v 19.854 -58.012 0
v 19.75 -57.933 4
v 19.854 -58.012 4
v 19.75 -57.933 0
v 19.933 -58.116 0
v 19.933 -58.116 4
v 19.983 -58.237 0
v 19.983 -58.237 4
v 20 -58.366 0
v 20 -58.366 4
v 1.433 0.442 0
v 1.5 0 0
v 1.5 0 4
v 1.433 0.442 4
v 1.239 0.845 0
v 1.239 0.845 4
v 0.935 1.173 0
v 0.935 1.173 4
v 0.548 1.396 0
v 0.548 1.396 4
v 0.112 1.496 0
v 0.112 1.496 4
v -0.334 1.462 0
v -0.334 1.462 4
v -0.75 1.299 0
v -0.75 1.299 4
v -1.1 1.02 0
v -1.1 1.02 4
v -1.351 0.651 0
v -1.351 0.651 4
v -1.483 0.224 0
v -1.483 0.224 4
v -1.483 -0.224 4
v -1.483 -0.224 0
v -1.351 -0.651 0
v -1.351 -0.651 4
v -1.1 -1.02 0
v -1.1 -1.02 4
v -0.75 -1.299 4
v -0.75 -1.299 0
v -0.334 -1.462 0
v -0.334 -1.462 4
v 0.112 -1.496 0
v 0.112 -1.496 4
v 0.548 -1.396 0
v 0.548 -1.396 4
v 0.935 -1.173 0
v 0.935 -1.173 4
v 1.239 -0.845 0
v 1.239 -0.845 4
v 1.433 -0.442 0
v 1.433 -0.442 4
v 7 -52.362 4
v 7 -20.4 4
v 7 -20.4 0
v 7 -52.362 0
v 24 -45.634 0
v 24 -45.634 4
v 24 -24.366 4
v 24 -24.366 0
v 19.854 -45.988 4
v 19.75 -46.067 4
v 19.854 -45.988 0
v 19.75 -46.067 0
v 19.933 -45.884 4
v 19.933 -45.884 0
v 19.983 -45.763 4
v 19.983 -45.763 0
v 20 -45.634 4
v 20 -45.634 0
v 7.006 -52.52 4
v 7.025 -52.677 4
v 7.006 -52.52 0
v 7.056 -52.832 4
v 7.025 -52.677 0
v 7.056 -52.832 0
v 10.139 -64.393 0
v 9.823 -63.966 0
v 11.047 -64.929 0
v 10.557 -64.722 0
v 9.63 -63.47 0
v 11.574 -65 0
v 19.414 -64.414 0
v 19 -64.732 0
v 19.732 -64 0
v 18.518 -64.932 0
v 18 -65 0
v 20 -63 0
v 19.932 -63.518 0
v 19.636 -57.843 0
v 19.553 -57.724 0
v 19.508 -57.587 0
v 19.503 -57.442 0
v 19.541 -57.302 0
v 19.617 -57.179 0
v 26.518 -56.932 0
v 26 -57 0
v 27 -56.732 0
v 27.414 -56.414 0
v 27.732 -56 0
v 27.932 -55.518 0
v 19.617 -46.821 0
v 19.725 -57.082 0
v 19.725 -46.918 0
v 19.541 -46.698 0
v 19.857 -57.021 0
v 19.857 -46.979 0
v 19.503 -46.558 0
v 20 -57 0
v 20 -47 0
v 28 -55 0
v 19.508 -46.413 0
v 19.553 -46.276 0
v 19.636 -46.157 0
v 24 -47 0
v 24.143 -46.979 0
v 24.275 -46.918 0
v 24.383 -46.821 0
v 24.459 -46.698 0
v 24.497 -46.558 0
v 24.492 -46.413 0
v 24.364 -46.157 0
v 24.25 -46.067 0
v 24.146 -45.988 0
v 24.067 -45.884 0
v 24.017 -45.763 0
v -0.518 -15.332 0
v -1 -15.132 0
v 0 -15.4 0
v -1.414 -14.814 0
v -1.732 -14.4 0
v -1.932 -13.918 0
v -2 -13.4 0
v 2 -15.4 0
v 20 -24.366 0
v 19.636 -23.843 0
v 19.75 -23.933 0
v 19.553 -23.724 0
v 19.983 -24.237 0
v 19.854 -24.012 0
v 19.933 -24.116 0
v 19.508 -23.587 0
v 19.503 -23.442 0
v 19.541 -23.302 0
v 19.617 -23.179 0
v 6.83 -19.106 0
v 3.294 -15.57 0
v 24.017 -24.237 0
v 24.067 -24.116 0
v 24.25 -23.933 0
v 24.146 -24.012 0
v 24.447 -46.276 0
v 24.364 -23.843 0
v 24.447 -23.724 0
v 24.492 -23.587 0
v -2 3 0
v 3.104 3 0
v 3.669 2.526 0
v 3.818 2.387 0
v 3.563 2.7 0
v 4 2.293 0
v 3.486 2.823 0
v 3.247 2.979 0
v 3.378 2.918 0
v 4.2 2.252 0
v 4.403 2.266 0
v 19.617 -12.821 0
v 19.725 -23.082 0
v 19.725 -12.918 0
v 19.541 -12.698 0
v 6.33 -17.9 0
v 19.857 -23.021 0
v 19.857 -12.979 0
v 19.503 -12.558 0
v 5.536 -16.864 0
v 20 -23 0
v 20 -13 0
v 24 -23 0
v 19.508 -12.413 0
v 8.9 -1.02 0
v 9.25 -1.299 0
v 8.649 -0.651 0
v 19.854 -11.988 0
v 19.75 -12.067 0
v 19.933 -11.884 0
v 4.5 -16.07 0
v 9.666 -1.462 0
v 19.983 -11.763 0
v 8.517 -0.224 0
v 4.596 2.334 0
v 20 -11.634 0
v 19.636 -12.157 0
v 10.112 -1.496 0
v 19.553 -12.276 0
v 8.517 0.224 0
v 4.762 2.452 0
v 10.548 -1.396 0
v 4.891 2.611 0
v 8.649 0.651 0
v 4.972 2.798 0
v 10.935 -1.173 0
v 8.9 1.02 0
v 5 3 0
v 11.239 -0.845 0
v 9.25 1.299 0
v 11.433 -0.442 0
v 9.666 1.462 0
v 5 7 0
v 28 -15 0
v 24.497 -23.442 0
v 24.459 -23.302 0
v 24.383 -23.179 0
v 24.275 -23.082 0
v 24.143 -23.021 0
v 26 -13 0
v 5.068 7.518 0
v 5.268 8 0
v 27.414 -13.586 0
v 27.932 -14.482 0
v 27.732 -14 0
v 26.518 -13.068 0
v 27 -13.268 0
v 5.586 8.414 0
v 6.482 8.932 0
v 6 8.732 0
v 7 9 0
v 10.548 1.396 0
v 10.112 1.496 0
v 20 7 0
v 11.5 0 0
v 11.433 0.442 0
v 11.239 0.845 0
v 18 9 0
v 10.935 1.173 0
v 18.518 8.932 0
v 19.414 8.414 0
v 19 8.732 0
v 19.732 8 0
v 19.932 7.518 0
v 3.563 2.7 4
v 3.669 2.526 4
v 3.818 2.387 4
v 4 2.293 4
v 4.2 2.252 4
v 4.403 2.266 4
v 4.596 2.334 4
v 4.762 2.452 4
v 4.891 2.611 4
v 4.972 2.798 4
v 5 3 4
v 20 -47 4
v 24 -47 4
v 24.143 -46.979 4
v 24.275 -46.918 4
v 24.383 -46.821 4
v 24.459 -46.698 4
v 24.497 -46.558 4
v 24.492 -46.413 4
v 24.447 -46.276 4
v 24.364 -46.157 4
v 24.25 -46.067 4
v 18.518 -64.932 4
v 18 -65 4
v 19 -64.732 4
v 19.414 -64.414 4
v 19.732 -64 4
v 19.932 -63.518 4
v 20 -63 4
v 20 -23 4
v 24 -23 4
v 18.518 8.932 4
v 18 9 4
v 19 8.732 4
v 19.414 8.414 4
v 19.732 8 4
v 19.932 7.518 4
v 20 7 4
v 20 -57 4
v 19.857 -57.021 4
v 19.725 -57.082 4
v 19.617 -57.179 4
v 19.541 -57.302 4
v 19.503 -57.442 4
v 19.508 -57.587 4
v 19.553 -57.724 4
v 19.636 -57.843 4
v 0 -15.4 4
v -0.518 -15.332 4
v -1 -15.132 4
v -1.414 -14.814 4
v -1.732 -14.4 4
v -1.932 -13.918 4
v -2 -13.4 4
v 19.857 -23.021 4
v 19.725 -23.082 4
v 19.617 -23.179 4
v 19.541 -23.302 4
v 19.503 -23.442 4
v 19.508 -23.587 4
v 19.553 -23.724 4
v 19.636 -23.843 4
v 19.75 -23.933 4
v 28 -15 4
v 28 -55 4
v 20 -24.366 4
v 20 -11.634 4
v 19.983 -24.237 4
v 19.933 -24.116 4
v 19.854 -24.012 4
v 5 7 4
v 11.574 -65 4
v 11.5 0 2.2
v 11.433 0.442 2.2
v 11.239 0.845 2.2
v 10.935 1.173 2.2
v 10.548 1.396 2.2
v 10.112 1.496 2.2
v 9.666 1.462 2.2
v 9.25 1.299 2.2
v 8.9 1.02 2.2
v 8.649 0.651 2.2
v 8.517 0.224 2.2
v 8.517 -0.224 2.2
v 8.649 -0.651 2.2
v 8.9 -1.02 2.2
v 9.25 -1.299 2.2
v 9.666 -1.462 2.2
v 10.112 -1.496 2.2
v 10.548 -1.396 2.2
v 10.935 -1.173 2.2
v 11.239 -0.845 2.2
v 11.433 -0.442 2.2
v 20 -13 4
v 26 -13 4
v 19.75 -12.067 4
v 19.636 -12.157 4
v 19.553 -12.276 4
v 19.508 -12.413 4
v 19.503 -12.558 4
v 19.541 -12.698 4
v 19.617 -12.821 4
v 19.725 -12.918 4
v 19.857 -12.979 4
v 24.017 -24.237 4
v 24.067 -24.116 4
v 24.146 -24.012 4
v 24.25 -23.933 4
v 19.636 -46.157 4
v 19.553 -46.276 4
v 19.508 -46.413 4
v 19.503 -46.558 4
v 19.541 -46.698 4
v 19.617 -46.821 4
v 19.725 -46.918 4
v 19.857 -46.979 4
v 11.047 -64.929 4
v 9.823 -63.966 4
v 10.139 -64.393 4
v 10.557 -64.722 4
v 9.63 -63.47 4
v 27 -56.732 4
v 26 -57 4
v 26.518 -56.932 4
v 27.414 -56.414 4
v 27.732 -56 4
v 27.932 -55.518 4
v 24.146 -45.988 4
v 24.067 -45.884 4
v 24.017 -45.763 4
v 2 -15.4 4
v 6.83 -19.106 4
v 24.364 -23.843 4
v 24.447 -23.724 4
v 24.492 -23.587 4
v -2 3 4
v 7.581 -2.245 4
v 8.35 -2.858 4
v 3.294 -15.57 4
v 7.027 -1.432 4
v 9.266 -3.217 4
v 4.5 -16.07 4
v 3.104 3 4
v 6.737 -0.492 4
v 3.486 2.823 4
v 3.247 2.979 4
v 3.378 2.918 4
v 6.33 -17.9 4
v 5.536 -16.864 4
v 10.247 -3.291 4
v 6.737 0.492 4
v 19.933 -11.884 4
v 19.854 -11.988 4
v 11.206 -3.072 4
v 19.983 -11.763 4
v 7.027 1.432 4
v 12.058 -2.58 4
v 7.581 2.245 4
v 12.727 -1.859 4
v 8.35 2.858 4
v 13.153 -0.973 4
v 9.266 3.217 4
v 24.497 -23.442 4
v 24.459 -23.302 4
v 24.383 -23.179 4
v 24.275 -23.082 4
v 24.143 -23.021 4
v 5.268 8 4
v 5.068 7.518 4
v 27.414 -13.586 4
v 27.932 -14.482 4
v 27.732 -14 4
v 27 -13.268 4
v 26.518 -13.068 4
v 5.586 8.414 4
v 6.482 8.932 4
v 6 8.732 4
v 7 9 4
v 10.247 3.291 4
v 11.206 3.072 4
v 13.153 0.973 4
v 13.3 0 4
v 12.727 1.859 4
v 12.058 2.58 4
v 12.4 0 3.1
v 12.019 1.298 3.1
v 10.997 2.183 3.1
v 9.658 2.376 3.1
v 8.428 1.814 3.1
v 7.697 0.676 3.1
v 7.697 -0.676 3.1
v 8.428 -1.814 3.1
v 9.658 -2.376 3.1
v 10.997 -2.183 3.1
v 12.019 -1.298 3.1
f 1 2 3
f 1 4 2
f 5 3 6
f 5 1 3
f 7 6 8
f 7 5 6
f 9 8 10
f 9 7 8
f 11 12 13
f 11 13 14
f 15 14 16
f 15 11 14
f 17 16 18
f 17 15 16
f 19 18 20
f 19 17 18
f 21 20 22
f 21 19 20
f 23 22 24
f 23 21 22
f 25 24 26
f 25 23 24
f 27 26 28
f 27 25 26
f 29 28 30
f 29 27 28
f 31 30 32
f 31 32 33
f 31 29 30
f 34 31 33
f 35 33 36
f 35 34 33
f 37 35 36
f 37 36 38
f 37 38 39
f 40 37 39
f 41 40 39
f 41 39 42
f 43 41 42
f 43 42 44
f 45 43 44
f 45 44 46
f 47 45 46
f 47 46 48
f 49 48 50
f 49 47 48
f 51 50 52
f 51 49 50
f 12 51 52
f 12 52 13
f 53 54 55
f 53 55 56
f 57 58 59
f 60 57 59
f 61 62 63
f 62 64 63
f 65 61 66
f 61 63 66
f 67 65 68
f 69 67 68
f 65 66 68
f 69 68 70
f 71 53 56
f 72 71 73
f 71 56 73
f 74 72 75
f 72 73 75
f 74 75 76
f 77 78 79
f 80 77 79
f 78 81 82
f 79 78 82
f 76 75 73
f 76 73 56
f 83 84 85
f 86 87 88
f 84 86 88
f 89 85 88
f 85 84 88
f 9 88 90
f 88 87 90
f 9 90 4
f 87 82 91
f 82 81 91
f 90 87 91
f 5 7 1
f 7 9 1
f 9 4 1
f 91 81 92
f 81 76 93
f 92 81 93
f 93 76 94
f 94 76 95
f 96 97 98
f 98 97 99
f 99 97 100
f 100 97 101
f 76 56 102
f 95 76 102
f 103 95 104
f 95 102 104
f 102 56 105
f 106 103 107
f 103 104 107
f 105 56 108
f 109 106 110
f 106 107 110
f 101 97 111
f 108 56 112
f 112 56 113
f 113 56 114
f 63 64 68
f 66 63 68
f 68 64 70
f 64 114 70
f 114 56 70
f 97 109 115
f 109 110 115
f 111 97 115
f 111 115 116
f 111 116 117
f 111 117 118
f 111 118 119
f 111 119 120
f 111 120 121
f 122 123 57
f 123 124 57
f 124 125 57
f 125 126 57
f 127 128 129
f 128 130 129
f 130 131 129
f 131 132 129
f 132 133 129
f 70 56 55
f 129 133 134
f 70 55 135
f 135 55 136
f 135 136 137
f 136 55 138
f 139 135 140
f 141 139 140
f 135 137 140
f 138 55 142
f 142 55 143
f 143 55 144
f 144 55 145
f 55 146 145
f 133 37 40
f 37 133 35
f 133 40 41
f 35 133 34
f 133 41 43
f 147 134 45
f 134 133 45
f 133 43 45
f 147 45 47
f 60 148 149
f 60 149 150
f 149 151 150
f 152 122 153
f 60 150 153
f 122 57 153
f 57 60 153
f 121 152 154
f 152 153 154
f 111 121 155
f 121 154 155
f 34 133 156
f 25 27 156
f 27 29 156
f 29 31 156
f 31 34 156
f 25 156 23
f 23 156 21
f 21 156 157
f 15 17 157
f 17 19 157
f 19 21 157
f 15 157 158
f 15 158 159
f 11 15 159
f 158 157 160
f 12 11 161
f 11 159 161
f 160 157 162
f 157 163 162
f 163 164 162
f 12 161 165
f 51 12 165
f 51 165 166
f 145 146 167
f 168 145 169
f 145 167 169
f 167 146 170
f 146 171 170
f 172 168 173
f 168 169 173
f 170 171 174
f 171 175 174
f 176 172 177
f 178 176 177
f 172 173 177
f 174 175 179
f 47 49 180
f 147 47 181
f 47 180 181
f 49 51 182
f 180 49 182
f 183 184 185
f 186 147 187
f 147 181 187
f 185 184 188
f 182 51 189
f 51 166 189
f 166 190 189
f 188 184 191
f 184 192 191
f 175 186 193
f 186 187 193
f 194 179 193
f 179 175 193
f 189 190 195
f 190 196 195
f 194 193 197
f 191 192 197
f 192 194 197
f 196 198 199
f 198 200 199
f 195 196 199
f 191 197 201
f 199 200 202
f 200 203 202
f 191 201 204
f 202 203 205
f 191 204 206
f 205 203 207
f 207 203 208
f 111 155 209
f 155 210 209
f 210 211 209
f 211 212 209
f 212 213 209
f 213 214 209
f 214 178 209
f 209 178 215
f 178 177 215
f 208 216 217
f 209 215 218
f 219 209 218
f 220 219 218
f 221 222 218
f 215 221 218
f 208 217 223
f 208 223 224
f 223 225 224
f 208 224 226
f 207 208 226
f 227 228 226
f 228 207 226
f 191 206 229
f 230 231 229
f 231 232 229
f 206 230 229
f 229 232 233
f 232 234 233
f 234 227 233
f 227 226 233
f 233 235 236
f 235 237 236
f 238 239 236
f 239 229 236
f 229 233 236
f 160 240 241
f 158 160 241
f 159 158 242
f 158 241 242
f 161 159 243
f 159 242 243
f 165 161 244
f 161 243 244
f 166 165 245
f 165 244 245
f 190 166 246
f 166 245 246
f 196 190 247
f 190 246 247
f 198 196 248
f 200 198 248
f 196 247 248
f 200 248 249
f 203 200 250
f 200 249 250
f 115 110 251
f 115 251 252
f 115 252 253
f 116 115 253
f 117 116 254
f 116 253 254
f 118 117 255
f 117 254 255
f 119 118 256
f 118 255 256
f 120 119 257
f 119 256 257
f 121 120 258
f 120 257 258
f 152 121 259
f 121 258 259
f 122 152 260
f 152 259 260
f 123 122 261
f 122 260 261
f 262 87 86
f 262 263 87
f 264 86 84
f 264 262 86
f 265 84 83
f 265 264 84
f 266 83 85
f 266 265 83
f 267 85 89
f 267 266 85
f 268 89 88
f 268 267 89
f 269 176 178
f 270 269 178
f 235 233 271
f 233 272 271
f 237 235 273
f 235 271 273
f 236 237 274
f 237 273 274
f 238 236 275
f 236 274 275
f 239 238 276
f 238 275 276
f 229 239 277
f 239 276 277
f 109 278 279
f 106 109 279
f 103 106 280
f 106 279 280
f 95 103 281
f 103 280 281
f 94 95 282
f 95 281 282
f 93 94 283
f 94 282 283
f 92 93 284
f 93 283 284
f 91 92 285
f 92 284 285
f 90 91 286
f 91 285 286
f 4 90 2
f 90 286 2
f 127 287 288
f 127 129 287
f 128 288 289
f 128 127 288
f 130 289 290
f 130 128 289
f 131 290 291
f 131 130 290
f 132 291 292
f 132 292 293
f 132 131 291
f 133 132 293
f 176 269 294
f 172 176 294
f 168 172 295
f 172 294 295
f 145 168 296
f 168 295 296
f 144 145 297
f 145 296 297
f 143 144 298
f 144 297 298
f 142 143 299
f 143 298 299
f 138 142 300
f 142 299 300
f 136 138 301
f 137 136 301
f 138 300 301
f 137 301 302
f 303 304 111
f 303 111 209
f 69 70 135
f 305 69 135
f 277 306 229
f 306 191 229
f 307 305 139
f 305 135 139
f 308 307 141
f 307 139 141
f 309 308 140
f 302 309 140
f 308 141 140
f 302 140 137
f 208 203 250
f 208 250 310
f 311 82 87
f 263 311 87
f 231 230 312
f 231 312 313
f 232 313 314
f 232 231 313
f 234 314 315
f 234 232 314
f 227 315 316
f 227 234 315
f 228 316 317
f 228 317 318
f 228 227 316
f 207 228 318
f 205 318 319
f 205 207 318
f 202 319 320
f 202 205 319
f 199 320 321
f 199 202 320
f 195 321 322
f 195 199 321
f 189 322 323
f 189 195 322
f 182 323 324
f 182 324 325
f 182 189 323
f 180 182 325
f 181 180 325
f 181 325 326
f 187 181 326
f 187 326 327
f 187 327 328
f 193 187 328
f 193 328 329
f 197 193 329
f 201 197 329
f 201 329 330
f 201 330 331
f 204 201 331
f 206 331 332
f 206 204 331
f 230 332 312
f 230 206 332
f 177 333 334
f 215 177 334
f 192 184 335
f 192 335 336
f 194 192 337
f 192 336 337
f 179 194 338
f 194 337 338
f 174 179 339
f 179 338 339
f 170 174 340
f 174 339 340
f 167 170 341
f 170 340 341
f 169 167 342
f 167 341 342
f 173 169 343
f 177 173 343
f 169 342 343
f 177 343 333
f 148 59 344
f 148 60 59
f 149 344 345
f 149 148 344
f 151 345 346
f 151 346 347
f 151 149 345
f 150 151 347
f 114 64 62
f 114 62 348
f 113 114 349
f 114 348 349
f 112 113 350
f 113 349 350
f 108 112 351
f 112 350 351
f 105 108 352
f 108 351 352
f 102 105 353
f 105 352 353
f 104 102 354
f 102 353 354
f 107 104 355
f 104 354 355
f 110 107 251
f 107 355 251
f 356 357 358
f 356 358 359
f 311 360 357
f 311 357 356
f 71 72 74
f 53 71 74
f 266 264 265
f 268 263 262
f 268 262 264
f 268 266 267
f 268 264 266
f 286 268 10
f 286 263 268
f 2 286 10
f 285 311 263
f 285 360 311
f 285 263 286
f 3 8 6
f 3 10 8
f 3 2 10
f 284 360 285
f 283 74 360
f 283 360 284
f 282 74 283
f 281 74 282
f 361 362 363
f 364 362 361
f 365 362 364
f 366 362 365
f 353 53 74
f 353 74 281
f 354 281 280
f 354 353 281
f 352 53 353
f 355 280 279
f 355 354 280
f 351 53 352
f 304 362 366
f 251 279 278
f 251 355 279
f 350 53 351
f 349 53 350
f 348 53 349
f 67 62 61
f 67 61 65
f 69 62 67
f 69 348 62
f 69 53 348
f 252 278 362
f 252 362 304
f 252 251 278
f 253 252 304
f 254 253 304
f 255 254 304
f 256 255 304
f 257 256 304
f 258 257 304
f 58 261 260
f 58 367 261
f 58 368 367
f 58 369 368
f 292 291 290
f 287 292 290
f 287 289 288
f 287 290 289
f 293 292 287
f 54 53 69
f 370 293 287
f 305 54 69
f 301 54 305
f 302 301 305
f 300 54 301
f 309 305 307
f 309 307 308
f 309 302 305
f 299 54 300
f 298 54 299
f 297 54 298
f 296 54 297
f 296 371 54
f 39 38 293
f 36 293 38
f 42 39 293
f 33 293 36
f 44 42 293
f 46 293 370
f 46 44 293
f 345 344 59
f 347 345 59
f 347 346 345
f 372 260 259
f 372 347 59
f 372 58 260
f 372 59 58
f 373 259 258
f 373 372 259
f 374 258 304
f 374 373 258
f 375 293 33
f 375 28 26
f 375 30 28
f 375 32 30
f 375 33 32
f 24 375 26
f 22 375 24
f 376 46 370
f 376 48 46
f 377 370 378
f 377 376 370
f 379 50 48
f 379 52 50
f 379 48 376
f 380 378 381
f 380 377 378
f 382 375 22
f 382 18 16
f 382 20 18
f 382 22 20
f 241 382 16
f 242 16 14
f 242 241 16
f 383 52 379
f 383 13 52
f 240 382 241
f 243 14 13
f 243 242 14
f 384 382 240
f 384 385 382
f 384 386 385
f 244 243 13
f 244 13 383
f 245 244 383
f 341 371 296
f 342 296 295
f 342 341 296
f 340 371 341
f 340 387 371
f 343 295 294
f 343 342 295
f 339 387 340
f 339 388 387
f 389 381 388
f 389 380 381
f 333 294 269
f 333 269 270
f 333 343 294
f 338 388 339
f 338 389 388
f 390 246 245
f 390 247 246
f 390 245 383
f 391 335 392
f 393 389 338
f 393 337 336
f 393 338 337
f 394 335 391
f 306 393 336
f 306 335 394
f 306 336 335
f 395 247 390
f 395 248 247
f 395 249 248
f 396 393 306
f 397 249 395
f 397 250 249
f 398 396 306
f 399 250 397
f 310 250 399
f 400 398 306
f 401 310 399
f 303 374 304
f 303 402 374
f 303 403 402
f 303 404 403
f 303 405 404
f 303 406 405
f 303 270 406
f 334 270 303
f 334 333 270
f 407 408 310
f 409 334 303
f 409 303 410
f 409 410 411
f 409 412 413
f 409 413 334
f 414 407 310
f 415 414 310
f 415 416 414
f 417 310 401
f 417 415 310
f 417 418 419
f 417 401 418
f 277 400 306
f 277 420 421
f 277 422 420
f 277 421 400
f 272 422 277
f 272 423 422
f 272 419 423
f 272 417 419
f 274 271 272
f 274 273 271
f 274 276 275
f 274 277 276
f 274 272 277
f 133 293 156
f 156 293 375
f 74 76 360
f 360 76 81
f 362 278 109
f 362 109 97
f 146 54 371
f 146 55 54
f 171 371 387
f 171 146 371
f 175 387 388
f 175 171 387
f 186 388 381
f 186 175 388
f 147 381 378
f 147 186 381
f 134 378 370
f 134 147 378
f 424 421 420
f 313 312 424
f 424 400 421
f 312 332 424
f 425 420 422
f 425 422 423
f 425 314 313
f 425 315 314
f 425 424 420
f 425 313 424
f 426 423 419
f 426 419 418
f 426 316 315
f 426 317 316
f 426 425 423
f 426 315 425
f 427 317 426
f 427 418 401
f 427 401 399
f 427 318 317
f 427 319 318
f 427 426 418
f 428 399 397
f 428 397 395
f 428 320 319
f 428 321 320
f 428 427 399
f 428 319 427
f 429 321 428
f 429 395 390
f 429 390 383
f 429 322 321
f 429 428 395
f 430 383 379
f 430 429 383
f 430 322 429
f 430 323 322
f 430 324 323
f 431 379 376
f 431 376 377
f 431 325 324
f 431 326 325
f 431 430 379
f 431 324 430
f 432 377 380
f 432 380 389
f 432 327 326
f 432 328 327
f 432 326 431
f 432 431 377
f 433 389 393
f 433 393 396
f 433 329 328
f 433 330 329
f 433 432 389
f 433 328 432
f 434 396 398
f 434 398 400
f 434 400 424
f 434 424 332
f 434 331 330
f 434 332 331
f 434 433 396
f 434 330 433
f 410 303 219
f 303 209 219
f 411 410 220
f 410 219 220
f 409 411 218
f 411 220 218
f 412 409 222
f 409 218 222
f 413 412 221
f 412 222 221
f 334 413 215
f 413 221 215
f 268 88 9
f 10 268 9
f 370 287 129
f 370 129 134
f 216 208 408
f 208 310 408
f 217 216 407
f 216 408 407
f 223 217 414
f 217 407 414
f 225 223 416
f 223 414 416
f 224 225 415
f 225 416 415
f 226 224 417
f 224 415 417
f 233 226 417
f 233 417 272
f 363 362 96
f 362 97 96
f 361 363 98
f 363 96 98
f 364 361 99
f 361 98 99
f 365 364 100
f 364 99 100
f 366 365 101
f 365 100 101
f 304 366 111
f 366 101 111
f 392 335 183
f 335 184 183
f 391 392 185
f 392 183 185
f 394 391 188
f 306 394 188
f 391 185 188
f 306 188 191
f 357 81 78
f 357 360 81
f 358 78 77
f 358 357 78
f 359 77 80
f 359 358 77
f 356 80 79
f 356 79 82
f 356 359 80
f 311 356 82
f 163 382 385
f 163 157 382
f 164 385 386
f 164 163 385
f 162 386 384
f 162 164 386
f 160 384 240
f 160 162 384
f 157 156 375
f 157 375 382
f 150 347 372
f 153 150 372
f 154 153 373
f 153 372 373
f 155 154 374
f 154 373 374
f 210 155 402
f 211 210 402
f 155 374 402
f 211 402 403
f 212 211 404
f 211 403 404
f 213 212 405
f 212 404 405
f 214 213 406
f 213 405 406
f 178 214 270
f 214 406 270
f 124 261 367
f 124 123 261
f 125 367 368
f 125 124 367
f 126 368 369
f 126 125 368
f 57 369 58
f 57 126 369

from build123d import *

# Parameters (mm, degrees)
SKETCH_1_W          = 15
SKETCH_1_H          = 6
SKETCH_1_W_2        = 25
SKETCH_1_R          = 1.5
SKETCH_1_W_3        = 4
SKETCH_1_H_2        = 10
EXTRUDE_1_DEPTH     = 4
CUT_EXTRUDE_1_DEPTH = 4
CHAMFER_1_SIZE      = 1.8
SKETCH_3_W          = 4
SKETCH_3_H          = 44
EXTRUDE_2_DEPTH     = 4
CUT_EXTRUDE_2_DEPTH = 4
FILLET_1_R          = 0.5
SKETCH_12_W         = 3
SKETCH_12_H         = 18.4
CUT_EXTRUDE_6_DEPTH = 10
CUT_EXTRUDE_7_DEPTH = 10
FILLET_2_R          = 5
FILLET_3_R          = 2


with BuildPart() as part:
    # 草图1 → 凸台-拉伸1 (new body)
    # profile 1 of 5: a face of its own
    with BuildSketch(Plane.XY):
        with Locations((12.5, 6)):
            Rectangle(SKETCH_1_W, SKETCH_1_H)
    # profile 2 of 5: a face of its own
    with BuildSketch(Plane.XY):
        with Locations((7.5, 0)):
            Rectangle(SKETCH_1_W_2, SKETCH_1_H)
        Circle(SKETCH_1_R, mode=Mode.SUBTRACT)
        with Locations((10, 0)):
            Circle(SKETCH_1_R, mode=Mode.SUBTRACT)
    # profile 3 of 5: a face of its own
    with BuildSketch(Plane.XY):
        Polygon((10, -65), (20, -65), (20, -3), (-5, -3), align=None)
    # profile 4 of 5: a face of its own
    with BuildSketch(Plane.XY):
        with Locations((22, -18)):
            Rectangle(SKETCH_1_W_3, SKETCH_1_H_2)
    # profile 5 of 5: a face of its own
    with BuildSketch(Plane.XY):
        with Locations((22, -52)):
            Rectangle(SKETCH_1_W_3, SKETCH_1_H_2)
    extrude(amount=EXTRUDE_1_DEPTH)

    # 草图2 → 切除-拉伸1 (cut)
    with BuildSketch(Plane.XY.offset(4)):
        with BuildLine():
            Line((20, -13), (20, -12))
            ThreePointArc((20, -12), (19.5, -12.5), (20, -13))
        make_face()
        with BuildLine():
            Line((20, -24), (20, -23))
            ThreePointArc((20, -23), (19.5, -23.5), (20, -24))
        make_face()
        with BuildLine():
            Line((20, -47), (20, -46))
            ThreePointArc((20, -46), (19.5, -46.5), (20, -47))
        make_face()
        with BuildLine():
            Line((20, -58), (20, -57))
            ThreePointArc((20, -57), (19.5, -57.5), (20, -58))
        make_face()
        with BuildLine():
            ThreePointArc((3.5, 3), (4.25, 2.25), (5, 3))
            Line((5, 3), (3.5, 3))
        make_face()
    extrude(amount=-CUT_EXTRUDE_1_DEPTH, mode=Mode.SUBTRACT)

    # 倒角1
    chamfer_1_edges = [part.edges().sort_by_distance(p)[0] for p in [
        (8.5, 0, 4),
    ]]
    chamfer(chamfer_1_edges, length=CHAMFER_1_SIZE)

    # 草图3 → 凸台-拉伸2 (add)
    with BuildSketch(Plane.XY.offset(4)):
        with Locations((26, -35)):
            Rectangle(SKETCH_3_W, SKETCH_3_H)
    extrude(amount=-EXTRUDE_2_DEPTH)

    # 草图4 → 切除-拉伸2 (cut)
    with BuildSketch(Plane.XY.offset(4)):
        with BuildLine():
            Line((24, -23), (24, -24))
            ThreePointArc((24, -24), (24.5, -23.5), (24, -23))
        make_face()
        with BuildLine():
            Line((24, -46), (24, -47))
            ThreePointArc((24, -47), (24.5, -46.5), (24, -46))
        make_face()
    extrude(amount=-CUT_EXTRUDE_2_DEPTH, mode=Mode.SUBTRACT)

    # 圆角1
    fillet_1_edges = [part.edges().sort_by_distance(p)[0] for p in [
        (24, -24, 2),
        (24, -46, 2),
        (20, -24, 2),
        (20, -46, 2),
        (20, -58, 2),
        (3.5, 3, 2),
        (20, -12, 2),
    ]]
    fillet(fillet_1_edges, radius=FILLET_1_R)

    # 草图12 → 切除-拉伸6 (cut)
    with BuildSketch(Plane.XY.offset(4)):
        with Locations((-3.5, -6.2)):
            Rectangle(SKETCH_12_W, SKETCH_12_H)
    extrude(amount=-CUT_EXTRUDE_6_DEPTH, mode=Mode.SUBTRACT)

    # 草图13 → 切除-拉伸7 (cut)
    with BuildSketch(Plane.XY.offset(4)):
        Polygon((7, -52.6), (-2, -15.4), (7, -15.4), align=None)
    extrude(amount=-CUT_EXTRUDE_7_DEPTH, mode=Mode.SUBTRACT)

    # 圆角2
    fillet_2_edges = [part.edges().sort_by_distance(p)[0] for p in [
        (7, -15.4, 2),
    ]]
    fillet(fillet_2_edges, radius=FILLET_2_R)

    # 圆角3
    fillet_3_edges = [part.edges().sort_by_distance(p)[0] for p in [
        (28, -13, 2),
        (28, -57, 2),
        (-2, -15.4, 2),
        (7, -52.6, 2),
        (5, 9, 2),
        (20, 9, 2),
        (20, -65, 2),
        (10, -65, 2),
    ]]
    fillet(fillet_3_edges, radius=FILLET_3_R)


solid = part.part
